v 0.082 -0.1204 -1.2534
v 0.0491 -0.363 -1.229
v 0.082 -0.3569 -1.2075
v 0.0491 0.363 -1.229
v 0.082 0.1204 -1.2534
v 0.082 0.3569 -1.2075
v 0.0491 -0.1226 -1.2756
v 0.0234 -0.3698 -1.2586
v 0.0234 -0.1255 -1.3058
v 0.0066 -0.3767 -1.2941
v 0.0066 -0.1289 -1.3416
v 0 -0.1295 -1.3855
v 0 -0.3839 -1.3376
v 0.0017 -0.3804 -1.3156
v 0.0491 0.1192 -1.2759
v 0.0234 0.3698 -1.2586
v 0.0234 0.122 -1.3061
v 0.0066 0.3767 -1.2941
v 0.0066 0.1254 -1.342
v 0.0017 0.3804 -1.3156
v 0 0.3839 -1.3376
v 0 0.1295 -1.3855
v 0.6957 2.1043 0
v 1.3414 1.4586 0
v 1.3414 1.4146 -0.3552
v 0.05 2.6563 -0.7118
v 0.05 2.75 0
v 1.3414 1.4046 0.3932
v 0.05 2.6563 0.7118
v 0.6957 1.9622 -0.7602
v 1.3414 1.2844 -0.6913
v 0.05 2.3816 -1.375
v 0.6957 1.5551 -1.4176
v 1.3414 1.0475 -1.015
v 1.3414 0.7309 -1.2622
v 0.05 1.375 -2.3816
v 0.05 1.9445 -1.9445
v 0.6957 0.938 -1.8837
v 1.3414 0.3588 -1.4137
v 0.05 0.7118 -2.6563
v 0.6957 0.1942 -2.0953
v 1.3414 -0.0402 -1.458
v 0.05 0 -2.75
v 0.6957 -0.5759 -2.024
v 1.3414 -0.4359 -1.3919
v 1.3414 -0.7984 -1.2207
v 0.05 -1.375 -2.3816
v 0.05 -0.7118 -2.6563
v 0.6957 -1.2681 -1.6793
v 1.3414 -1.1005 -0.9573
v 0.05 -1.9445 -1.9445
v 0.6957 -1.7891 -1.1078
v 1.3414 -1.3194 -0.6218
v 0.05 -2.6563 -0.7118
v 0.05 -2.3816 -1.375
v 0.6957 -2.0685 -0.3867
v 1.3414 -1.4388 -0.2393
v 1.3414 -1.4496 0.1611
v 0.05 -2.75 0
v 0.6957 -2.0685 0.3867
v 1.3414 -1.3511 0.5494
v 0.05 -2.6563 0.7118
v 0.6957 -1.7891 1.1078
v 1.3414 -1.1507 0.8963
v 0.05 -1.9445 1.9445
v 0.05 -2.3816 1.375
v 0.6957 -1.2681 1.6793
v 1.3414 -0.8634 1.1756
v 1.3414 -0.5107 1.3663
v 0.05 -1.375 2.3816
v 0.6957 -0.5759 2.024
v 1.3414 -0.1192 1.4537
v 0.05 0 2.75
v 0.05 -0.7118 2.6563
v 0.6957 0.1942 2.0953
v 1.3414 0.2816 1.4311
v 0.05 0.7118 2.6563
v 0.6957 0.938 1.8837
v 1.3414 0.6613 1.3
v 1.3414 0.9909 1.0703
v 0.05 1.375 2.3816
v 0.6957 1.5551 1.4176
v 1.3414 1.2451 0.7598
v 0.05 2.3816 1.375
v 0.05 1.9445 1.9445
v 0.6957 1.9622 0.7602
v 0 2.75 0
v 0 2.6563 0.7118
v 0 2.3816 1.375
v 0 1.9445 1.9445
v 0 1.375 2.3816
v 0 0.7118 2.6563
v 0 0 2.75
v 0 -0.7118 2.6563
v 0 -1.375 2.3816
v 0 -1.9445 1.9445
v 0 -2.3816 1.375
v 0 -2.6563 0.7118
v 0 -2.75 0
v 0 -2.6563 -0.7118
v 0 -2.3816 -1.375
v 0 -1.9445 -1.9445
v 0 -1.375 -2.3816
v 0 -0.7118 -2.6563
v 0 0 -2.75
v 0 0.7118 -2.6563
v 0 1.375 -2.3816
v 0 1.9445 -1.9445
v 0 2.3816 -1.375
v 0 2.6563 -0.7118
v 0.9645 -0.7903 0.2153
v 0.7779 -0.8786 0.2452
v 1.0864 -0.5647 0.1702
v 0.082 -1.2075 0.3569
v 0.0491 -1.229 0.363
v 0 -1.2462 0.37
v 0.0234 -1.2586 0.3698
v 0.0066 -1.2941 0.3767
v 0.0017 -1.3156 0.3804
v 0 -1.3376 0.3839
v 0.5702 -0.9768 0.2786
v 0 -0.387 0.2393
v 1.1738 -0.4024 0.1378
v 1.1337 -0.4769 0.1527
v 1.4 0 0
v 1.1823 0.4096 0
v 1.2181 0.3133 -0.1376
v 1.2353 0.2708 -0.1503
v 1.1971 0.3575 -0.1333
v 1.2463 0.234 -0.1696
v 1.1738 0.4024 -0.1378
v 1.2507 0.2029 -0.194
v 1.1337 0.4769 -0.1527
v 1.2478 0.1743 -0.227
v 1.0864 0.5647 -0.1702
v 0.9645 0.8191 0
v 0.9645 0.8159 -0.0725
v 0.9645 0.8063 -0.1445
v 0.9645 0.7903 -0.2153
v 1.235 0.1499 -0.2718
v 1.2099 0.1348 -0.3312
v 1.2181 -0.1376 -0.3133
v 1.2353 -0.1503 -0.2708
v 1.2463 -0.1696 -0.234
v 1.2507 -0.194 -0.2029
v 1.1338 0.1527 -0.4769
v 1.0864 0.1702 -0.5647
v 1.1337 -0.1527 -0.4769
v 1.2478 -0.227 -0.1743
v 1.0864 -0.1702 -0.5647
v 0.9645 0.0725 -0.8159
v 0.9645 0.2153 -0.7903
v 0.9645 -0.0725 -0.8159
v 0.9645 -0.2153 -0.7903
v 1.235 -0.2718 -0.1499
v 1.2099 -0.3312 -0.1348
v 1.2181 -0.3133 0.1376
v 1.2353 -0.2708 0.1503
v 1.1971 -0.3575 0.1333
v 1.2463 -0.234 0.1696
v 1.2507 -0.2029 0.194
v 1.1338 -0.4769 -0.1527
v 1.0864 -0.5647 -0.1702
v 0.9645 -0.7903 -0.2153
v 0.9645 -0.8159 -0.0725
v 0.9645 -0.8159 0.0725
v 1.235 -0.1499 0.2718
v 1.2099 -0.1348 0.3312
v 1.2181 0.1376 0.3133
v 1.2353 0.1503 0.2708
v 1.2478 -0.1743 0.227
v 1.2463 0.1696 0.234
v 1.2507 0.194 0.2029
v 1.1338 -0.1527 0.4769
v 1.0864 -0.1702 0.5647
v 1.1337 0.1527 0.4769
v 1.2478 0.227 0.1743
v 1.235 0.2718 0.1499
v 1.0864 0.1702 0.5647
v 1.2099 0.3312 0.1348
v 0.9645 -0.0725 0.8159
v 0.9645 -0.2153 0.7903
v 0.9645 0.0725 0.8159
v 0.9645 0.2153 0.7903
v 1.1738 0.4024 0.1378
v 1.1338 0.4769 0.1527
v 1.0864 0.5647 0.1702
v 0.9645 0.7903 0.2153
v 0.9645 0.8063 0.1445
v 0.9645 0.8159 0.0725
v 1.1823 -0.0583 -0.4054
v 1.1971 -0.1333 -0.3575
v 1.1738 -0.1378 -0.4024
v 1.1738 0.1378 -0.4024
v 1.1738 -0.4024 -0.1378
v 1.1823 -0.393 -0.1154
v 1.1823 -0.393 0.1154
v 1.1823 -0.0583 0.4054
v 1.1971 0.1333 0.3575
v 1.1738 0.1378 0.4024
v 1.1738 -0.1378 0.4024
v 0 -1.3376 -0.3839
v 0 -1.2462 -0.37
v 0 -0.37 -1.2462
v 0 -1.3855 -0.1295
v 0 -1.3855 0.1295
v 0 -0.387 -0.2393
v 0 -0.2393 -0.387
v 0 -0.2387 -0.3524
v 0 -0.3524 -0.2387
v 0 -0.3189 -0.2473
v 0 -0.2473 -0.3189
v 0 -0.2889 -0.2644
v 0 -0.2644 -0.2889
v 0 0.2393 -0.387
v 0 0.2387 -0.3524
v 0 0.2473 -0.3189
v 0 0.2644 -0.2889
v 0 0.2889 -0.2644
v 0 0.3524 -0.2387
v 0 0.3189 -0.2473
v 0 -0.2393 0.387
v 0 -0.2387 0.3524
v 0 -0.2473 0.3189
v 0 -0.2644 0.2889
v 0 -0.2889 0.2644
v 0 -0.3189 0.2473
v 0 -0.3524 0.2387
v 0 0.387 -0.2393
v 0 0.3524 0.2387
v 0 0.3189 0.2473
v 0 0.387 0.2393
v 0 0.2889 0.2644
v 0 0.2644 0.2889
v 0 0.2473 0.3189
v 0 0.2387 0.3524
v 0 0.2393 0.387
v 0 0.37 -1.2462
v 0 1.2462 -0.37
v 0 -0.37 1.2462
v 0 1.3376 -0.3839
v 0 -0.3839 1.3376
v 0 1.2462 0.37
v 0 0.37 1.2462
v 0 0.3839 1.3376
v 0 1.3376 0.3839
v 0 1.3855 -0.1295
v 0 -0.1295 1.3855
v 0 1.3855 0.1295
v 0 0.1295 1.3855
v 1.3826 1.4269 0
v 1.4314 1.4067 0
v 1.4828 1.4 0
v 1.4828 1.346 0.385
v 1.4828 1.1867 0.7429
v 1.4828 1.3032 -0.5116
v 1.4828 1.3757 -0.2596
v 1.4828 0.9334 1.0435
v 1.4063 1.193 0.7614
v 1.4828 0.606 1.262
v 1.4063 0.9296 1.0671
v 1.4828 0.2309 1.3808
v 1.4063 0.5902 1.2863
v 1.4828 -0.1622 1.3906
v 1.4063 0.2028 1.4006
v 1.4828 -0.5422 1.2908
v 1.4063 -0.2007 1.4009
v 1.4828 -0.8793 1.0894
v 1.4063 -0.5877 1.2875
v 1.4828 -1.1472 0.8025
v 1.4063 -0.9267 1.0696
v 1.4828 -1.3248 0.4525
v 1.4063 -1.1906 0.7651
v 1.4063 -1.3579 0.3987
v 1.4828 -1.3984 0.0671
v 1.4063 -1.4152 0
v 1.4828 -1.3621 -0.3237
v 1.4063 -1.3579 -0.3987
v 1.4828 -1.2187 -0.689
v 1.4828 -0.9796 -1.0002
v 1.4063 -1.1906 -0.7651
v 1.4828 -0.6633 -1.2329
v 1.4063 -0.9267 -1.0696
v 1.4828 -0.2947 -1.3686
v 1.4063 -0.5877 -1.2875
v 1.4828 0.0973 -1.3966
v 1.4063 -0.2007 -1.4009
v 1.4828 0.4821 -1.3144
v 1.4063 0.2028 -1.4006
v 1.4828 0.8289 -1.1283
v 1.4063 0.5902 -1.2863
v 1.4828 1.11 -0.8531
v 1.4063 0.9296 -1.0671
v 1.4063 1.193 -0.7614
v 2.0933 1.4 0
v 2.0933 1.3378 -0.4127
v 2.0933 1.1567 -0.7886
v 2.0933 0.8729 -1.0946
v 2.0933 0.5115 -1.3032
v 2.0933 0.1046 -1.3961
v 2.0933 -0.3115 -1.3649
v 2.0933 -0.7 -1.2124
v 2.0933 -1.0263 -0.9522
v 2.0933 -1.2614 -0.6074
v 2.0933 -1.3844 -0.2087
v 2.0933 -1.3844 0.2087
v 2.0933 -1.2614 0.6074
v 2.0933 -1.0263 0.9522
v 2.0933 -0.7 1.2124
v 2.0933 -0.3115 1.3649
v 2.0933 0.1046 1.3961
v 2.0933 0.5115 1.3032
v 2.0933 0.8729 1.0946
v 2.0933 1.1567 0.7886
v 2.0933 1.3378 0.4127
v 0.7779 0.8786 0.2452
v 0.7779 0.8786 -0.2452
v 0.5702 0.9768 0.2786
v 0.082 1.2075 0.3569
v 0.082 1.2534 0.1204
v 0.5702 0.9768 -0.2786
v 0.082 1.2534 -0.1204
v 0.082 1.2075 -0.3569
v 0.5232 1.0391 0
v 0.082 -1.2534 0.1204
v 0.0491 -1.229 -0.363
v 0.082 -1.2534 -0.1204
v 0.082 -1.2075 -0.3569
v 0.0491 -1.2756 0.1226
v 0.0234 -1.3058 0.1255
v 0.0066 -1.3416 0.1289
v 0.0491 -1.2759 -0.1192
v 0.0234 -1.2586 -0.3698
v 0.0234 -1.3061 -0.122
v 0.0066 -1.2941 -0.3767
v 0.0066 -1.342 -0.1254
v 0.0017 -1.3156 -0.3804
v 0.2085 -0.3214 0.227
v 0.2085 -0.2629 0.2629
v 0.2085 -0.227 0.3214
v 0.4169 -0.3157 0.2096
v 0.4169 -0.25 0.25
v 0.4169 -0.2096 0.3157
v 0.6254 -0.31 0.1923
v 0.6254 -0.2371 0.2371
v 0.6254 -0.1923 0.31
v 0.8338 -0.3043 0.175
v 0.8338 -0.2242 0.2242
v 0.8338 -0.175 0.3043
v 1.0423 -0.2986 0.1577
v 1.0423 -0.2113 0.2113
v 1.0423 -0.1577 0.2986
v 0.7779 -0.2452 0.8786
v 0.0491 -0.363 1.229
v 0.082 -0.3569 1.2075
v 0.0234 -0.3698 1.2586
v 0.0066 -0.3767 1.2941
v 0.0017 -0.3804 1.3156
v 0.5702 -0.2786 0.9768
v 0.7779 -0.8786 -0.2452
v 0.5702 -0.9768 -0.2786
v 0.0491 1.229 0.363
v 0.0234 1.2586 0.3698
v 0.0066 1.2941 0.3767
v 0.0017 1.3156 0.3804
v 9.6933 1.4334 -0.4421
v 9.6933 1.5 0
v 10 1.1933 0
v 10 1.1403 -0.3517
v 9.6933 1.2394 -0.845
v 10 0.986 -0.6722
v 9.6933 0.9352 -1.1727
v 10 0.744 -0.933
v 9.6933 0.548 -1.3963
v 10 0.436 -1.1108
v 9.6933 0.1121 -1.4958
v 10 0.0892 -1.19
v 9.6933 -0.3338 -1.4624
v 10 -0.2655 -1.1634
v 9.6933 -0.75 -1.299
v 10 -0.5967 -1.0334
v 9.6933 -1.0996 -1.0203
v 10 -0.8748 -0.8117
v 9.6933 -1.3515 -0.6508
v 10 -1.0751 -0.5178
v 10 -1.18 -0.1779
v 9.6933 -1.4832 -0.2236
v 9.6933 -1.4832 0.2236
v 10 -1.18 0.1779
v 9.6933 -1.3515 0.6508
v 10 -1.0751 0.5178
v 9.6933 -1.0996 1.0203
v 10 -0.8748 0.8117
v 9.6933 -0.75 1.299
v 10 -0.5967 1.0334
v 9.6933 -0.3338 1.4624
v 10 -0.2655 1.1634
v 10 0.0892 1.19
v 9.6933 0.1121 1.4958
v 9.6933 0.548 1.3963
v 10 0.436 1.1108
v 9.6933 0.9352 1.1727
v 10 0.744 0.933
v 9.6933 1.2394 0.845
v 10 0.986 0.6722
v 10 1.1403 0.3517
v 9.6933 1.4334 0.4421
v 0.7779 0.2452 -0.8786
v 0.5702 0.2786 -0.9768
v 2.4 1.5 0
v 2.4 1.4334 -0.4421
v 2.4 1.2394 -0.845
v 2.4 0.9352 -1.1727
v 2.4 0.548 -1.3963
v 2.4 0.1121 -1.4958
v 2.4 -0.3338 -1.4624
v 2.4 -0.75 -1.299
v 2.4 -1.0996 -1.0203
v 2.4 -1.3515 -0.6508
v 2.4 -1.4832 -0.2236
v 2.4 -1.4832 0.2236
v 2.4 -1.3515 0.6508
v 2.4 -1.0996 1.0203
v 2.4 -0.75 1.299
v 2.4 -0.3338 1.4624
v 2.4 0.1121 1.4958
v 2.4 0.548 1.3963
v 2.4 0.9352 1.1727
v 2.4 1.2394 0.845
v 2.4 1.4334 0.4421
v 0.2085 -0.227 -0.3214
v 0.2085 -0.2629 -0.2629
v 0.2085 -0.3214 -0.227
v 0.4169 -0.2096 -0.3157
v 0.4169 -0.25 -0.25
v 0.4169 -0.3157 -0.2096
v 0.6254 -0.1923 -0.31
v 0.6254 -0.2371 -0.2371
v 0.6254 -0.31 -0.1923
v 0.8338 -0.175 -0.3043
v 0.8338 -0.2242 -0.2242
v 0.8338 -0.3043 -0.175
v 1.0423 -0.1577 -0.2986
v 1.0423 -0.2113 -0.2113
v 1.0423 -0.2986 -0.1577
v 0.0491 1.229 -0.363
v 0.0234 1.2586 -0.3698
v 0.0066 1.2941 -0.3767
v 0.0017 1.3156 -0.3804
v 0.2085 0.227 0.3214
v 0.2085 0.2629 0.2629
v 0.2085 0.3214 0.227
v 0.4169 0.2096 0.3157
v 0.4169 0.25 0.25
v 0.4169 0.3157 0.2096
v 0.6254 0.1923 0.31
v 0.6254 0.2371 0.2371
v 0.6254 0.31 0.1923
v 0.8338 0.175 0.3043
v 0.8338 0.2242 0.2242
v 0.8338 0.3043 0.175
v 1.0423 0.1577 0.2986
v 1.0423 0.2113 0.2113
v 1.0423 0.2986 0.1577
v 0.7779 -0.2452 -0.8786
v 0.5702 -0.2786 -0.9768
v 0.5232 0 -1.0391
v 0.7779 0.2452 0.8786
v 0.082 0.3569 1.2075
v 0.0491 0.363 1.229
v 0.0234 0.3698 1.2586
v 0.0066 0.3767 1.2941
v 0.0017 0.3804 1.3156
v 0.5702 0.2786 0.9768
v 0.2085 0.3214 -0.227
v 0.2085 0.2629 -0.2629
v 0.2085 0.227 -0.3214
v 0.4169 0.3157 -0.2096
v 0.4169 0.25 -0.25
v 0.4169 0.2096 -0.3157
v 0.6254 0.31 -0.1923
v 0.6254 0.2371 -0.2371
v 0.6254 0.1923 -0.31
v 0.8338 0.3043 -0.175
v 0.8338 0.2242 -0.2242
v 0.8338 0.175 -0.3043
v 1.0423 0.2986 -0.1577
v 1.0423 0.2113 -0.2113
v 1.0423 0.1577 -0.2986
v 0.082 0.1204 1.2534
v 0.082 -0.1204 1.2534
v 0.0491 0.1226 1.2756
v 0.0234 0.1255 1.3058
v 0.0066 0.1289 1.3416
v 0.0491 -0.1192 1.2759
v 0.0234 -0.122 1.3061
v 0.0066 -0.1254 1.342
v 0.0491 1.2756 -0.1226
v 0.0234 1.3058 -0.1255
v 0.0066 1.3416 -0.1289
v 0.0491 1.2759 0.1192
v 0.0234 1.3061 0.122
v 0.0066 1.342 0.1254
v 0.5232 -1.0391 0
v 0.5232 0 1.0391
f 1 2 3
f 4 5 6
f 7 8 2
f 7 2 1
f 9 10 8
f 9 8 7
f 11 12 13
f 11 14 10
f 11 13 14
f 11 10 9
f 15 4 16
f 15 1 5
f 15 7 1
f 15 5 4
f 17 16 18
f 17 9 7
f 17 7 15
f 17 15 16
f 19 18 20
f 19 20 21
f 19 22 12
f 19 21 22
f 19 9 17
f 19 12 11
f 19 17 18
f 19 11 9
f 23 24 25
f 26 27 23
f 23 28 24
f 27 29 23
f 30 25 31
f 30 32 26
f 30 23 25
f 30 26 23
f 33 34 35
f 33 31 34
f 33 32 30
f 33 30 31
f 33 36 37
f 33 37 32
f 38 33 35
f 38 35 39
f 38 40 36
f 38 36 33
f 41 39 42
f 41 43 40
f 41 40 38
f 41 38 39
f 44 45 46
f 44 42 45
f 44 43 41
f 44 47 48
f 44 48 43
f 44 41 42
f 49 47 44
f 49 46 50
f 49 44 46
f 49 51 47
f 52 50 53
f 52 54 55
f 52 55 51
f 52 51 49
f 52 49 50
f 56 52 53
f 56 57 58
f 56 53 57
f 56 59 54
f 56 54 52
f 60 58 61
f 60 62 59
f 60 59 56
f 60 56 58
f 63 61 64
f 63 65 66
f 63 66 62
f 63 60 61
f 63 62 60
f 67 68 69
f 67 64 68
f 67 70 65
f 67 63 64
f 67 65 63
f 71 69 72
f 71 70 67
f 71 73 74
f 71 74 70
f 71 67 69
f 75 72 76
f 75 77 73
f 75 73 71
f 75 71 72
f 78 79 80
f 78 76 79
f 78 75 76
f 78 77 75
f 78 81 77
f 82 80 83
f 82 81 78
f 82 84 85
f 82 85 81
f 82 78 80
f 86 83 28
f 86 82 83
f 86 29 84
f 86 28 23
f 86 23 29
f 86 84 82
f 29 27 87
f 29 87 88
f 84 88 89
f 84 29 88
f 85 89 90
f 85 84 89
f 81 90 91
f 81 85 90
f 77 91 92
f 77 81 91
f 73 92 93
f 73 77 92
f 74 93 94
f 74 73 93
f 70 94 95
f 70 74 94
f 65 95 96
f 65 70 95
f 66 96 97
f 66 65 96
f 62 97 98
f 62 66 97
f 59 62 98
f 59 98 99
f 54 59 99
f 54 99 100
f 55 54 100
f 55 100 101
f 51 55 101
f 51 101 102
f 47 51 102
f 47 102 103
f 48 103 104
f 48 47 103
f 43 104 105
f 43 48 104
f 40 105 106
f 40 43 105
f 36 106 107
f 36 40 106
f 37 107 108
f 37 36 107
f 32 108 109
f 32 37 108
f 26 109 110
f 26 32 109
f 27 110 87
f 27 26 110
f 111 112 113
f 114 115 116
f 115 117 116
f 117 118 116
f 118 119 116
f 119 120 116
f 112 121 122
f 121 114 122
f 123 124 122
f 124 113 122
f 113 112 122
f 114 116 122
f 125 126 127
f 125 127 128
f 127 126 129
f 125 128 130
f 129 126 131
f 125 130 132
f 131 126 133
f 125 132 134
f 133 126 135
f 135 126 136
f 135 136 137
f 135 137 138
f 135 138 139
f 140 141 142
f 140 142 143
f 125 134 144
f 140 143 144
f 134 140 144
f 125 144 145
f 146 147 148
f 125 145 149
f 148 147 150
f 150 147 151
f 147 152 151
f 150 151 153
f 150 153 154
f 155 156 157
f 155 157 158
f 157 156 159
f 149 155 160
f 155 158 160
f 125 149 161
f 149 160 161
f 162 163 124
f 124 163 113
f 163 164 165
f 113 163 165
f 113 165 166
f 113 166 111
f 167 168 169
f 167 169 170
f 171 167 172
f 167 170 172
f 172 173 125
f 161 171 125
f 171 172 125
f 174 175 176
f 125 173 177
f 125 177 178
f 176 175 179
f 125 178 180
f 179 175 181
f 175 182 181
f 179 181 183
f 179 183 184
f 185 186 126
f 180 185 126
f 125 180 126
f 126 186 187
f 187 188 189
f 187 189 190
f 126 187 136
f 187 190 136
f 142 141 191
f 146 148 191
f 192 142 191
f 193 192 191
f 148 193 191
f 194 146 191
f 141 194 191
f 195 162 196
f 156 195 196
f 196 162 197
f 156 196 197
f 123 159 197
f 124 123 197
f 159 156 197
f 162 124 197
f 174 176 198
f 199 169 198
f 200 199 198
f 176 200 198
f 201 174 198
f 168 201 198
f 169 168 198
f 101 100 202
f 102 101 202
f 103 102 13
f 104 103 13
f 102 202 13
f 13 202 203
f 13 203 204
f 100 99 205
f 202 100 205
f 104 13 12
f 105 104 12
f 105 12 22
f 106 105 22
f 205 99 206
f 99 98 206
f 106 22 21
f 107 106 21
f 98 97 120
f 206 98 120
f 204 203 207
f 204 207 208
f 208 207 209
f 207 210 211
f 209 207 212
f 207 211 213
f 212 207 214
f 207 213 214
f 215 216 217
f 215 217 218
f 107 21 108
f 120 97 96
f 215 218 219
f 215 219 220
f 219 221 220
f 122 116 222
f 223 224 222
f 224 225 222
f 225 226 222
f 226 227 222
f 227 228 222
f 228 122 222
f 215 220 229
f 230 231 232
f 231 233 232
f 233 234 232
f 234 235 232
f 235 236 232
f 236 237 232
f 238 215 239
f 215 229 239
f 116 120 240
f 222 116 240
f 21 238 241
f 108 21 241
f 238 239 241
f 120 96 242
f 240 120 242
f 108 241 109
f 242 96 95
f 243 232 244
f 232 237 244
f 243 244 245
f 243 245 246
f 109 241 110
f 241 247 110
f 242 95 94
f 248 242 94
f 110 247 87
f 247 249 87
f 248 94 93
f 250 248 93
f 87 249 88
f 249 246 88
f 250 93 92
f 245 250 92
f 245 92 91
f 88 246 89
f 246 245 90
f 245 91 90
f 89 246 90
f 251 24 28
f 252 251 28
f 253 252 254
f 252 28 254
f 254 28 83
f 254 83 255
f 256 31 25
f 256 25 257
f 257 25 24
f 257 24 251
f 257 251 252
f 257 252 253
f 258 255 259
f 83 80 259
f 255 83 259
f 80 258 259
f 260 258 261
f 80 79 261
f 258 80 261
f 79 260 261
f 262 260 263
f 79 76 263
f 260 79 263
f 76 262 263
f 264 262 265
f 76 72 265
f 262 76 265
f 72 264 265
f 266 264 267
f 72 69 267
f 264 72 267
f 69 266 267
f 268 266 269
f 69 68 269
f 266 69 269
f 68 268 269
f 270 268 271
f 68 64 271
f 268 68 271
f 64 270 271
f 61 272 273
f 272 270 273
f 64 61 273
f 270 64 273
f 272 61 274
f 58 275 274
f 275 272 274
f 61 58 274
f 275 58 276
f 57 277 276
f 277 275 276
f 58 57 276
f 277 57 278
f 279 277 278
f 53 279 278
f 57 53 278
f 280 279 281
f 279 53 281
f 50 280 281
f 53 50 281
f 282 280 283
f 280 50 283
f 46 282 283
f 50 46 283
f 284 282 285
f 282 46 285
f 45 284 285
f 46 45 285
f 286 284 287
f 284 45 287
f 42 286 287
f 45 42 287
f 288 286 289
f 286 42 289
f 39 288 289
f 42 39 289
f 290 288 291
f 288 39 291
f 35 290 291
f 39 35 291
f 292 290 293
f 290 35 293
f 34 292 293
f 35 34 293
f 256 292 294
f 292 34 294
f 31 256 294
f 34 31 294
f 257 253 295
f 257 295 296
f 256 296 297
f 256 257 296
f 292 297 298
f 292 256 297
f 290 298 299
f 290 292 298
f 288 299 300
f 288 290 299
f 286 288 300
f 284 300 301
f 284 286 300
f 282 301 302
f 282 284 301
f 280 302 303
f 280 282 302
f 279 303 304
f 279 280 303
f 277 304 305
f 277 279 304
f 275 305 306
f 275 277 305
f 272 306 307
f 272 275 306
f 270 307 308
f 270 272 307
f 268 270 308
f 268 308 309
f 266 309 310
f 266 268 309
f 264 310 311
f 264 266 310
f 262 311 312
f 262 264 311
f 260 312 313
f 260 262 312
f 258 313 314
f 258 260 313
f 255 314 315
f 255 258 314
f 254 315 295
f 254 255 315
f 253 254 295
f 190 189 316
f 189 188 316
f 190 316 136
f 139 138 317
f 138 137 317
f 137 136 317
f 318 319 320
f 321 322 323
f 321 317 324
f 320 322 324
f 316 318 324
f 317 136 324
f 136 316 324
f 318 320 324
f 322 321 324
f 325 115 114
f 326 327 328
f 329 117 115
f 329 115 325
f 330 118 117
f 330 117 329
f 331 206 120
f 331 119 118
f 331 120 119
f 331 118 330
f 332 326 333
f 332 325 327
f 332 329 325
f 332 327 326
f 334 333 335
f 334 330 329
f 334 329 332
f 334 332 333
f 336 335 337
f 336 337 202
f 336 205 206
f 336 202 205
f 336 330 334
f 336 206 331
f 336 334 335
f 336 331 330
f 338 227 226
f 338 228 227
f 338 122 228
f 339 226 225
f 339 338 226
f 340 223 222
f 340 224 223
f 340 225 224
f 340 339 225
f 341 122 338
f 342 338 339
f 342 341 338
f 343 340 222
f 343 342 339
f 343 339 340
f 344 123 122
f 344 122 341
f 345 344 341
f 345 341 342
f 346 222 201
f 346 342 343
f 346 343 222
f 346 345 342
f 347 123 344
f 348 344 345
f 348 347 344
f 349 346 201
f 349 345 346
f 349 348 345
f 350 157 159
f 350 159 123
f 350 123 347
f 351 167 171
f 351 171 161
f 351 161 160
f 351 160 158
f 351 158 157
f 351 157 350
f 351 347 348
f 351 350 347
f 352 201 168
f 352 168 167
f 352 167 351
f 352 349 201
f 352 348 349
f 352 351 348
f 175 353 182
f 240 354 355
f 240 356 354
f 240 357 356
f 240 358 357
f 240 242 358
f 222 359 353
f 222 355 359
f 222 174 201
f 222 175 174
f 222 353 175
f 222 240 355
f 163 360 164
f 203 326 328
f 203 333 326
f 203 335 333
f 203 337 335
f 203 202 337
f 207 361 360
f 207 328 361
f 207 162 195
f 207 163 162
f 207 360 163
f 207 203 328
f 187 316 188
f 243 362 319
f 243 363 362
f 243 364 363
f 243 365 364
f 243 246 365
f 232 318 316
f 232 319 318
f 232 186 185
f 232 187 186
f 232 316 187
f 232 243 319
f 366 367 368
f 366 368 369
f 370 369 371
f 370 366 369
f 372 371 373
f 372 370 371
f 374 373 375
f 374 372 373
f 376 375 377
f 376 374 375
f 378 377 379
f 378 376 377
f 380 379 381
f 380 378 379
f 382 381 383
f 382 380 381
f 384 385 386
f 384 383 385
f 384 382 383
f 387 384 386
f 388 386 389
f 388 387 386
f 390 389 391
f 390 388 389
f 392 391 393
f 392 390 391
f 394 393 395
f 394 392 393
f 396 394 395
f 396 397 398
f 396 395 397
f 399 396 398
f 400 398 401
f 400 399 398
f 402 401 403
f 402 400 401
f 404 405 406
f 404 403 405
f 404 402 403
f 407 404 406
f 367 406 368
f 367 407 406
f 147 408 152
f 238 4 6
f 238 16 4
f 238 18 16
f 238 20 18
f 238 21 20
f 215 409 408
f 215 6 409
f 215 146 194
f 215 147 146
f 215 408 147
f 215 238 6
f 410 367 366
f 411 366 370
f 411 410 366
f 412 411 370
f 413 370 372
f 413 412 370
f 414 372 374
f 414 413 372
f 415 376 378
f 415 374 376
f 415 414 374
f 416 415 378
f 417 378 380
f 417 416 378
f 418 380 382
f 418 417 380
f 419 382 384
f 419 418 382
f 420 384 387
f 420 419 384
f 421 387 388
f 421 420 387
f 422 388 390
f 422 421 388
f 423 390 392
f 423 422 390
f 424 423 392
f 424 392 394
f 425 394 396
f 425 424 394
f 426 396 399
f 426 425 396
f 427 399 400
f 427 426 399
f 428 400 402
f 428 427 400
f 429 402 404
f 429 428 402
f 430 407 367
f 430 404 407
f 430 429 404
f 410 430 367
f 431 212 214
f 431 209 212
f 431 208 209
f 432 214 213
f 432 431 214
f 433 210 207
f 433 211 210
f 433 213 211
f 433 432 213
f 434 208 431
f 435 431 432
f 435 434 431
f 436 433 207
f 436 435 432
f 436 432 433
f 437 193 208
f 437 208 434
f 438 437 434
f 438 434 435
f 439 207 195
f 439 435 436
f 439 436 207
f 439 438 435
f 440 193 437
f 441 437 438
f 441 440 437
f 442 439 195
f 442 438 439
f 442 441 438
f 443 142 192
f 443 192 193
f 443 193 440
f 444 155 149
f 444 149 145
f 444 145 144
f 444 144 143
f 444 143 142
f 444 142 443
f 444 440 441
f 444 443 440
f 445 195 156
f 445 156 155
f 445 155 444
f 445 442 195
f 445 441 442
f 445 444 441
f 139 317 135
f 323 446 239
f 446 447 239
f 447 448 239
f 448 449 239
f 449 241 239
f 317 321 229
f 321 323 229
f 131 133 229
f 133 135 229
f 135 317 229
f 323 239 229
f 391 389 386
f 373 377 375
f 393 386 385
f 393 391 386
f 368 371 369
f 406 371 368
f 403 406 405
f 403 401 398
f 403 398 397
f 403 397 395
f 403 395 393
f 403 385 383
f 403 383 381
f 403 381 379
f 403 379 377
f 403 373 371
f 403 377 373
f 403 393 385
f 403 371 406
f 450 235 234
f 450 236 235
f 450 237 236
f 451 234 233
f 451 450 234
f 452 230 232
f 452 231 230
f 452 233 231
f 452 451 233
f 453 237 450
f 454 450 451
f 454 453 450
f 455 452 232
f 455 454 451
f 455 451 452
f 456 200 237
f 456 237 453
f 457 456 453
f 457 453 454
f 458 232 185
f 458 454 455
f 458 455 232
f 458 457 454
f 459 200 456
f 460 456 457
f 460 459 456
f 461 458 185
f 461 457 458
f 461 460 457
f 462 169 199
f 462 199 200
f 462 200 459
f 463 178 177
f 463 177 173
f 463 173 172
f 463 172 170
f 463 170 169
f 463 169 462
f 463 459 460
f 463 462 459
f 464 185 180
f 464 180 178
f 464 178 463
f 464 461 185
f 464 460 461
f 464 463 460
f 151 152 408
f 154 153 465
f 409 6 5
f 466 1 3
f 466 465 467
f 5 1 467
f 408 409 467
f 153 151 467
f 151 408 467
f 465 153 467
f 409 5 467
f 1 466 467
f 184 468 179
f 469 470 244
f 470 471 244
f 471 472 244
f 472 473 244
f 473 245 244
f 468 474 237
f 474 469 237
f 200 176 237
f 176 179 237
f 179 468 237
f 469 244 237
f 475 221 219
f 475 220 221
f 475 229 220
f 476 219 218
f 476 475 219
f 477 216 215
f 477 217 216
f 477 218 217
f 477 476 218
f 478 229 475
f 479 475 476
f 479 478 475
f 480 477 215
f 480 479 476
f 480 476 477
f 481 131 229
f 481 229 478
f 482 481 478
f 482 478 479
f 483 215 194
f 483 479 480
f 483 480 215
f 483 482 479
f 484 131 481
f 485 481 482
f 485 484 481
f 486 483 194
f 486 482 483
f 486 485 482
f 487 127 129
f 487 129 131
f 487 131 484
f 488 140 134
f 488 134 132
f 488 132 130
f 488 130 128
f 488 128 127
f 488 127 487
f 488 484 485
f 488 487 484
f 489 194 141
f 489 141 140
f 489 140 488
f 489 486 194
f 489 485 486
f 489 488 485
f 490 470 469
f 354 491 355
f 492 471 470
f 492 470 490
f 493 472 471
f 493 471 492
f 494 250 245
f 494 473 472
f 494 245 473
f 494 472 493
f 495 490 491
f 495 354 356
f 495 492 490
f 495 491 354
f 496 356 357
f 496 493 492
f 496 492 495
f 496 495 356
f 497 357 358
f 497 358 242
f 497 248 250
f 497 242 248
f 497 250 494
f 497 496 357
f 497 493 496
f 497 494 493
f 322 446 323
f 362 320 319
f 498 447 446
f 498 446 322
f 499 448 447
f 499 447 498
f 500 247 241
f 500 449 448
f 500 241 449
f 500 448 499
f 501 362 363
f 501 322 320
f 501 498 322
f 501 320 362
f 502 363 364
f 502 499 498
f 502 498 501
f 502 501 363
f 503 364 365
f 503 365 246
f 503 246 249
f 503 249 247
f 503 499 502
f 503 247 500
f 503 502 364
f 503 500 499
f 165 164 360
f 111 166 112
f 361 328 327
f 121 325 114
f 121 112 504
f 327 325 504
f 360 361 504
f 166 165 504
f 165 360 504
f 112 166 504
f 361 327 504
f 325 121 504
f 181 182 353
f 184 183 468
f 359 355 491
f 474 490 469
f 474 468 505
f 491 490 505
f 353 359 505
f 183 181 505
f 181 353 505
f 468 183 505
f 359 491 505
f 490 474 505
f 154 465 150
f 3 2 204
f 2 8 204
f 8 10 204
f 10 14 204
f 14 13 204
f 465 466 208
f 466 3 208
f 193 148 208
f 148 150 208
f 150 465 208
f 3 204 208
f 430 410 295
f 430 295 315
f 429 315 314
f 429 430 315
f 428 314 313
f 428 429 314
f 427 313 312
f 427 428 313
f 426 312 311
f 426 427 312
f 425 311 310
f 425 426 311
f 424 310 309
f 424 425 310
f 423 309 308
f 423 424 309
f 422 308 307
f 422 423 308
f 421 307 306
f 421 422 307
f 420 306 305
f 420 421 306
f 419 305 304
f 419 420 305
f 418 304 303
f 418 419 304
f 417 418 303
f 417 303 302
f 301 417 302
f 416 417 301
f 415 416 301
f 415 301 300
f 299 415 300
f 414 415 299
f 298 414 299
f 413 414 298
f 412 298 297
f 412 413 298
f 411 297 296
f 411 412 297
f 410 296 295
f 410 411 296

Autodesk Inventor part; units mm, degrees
ref_plane "YZ Plane" through (0, 0, 0) normal (1, 0, 0) x (0, 1, 0)
ref_plane "XZ Plane" through (0, 0, 0) normal (0, 1, 0) x (-1, 0, 0)
sketch "Sketch1" plane through (0, 0, 0) normal (0, 0, 1) x (1, 0, 0)
  line L0 (1.4, 0) -> (10, 0)
  line L1 (10, 0) -> (10, 1.5)
  line L2 (10, 1.5) -> (2.4, 1.5)
  line L3 (2.4, 1.5) -> (2.0933, 1.4)
  line L4 (2.0933, 1.4) -> (1.4, 1.4)
  line L5 (0, 2.75) -> (0, 1.3)
  line L6 (0, 1.3) -> (0.9645, 0.8191)
  line L7 (0.9645, 0.8191) -> (1.4, 0)
  line L8 (-2, 0) -> (12, 0) projected
  line L9 (0, -0.55) -> (0, 3.3) projected
  line L10 (0, 2.75) -> (0.05, 2.75)
  line L11 (0.05, 2.75) -> (1.4, 1.4)
  line L12 (2.4, 1.5) -> (1.3, 1.5) construction
  dimension "d1" = 7.6
  dimension "d2" = 3
  dimension "d3" = 2.8
  dimension "d4" = 2.6
  dimension "d5" = 26.5
  dimension "d6" = 62
  dimension "d7" = 1.4
  dimension "d8" = 0.3067
  dimension "d12" = 5.5
  dimension "d13" = 45
  dimension "d15" = 10
  dimension "d24" = 1.4
revolve "Body" add sketch "Sketch1" angle 360 about axis through (1.4, 0, 0) along (1, 0, 0) contours L7 L6 L5 L10 L11 L4 L3 L2 L1 L0
sketch "Sketch2" plane through (0, 0, 0) normal (-1, 0, 0) x (0, 0, 1)
  line L0 (0, 1.3) -> (0, 0) construction
  line L1 (0, 0) -> (1.3, 0) construction
  arc A0 (0.39, 0) -> (0, 0.39) centre (0, 0) ccw construction
  arc A1 (0.455, 0) -> (0, 0.455) centre (0, 0) ccw construction
  arc A2 (1.2462, 0.37) -> (0.37, 1.2462) centre (0, 0) ccw
  line L2 (0, 0) -> (0.9192, 0.9192) construction
  line L3 (0.37, 1.2462) -> (0.2393, 0.387)
  line L4 (1.2462, 0.37) -> (0.387, 0.2393)
  arc A3 (0.37, 1.2462) -> (0, 1.3) centre (0, 0) ccw
  arc A4 (1.3, 0) -> (1.2462, 0.37) centre (0, 0) ccw
  line L5 (0, -3.85) -> (0, 3.85) projected
  line L6 (-3.85, 0) -> (3.85, 0) projected
  arc A5 (0.37, -1.2462) -> (1.2462, -0.37) centre (0, 0) ccw
  line L7 (0.37, -1.2462) -> (0.2393, -0.387)
  line L8 (1.2462, -0.37) -> (0.387, -0.2393)
  arc A6 (0, -1.3) -> (0.37, -1.2462) centre (0, 0) ccw
  arc A7 (1.2462, -0.37) -> (1.3, 0) centre (0, 0) ccw
  arc A8 (-0.37, 1.2462) -> (-1.2462, 0.37) centre (0, 0) ccw
  line L9 (-0.37, 1.2462) -> (-0.2393, 0.387)
  line L10 (-1.2462, 0.37) -> (-0.387, 0.2393)
  arc A9 (0, 1.3) -> (-0.37, 1.2462) centre (0, 0) ccw
  arc A10 (-1.2462, 0.37) -> (-1.3, 0) centre (0, 0) ccw
  arc A11 (-0.37, -1.2462) -> (0, -1.3) centre (0, 0) ccw
  arc A12 (-1.2462, -0.37) -> (-0.37, -1.2462) centre (0, 0) ccw
  arc A13 (-1.3, 0) -> (-1.2462, -0.37) centre (0, 0) ccw
  line L11 (-1.2462, -0.37) -> (-0.387, -0.2393)
  line L12 (-0.37, -1.2462) -> (-0.2393, -0.387)
  arc A14 (0.2393, 0.387) -> (0.387, 0.2393) centre (0.3675, 0.3675) ccw
  arc A15 (0.387, -0.2393) -> (0.2393, -0.387) centre (0.3675, -0.3675) ccw
  arc A16 (-0.387, 0.2393) -> (-0.2393, 0.387) centre (-0.3675, 0.3675) ccw
  arc A17 (-0.2393, -0.387) -> (-0.387, -0.2393) centre (-0.3675, -0.3675) ccw
  point P0 (0.9192, -0.9192)
  point P1 (-0.9192, 0.9192)
  point P2 (-0.9192, -0.9192)
  dimension "d17" = 0.78
  dimension "d18" = 0.91
  dimension "d19" = 2.6
  dimension "d20" = 45
  dimension "d21" = 0.37
extrude "Slot" add sketch "Sketch2" against normal up to surface draft 5 contours L4 A14 L3 A2 | A5 L7 A15 L8 | L9 A16 L10 A8 | A12 L11 A17 L12
fillet "Fillet1" radius 0.148 4 edges at (0, 1.3, 0) (0, 0, -1.3) (0, -1.3, 0) (0, 0, 1.3)
thread "Thread" size "M3x0.5" designation "M3" class "6g" standard "GB Metric profile" length 7.6
ref_plane "Work Plane2" through (3.35, 0, 0) normal (0, 0, -1) x (1, 0, 0)
fillet "Fillet2" radius 0.2 1 edges at (1.4, -1.4, 0)
chamfer "Chamfer1" distance 0.3067 distance2 0.3067 1 edges at (10, -1.5, 0) measured on face at (10, -0.5112, 0.3316)
equation "\"d1\" = GEL"
equation "\"d2\" = GD"
equation "\"d3\" = BDM"
equation "\"d4\" = SDM"
equation "\"d7\" = INTI"
equation "\"d8\" = GAL"
equation "\"d12\" = KOD"
equation "\"d13\" = 0.5 * SEWI"
equation "\"d15\" = NLG"
equation "\"d24\" = KOH"
equation "\"d17\" = 0.3 * SDM"
equation "\"d18\" = 0.35 * SDM"
equation "\"d19\" = SDM"
equation "\"d21\" = 0.5 * SBR"
equation "\"d23\" = 0.2 * SBR"
equation "\"d10\" = GEL"
equation "\"d93\" = r"
equation "\"d94\" = -0.5 * SPD + 0.5 * GD"
equation "\"NLG\" = 10"
equation "\"GEL\" = -KOH + NLG - INA"
equation "\"GAL\" = 0.61345 * PTC"
equation "\"SPD\" = NND - 1.2269 * PTC"
equation "\"KOD\" = 5.5"
equation "\"KOH\" = 1.4"
equation "\"SBR\" = 0.74"
equation "\"INTI\" = 1.4"
equation "\"SDM\" = 2.6"
equation "\"GD\" = NND"
equation "\"BDM\" = 2.8"
equation "\"SEWI\" = 90deg"
equation "\"d9\" = SDM"
equation "\"GUL\" = 0.61345 * PTC"
equation "\"TOA\" = 30deg"
equation "\"PTC\" = 0.5"
equation "\"EPV\" = 1.8"
equation "\"THREADDIA\" = 3"
equation "\"FAWI\" = 90deg"
equation "\"RR\" = 0.4"
equation "\"KOHMIN\" = 1.26"
equation "\"NND\" = 3"
equation "\"GD1\" = THREADDIA - 1.2269 * PTC"
equation "\"INA\" = 1"
equation "\"r\" = 0.2"
properties part number "Screw GB/T 13806.1-1992 B M3 x 10" material "Steel, Mild-1"
